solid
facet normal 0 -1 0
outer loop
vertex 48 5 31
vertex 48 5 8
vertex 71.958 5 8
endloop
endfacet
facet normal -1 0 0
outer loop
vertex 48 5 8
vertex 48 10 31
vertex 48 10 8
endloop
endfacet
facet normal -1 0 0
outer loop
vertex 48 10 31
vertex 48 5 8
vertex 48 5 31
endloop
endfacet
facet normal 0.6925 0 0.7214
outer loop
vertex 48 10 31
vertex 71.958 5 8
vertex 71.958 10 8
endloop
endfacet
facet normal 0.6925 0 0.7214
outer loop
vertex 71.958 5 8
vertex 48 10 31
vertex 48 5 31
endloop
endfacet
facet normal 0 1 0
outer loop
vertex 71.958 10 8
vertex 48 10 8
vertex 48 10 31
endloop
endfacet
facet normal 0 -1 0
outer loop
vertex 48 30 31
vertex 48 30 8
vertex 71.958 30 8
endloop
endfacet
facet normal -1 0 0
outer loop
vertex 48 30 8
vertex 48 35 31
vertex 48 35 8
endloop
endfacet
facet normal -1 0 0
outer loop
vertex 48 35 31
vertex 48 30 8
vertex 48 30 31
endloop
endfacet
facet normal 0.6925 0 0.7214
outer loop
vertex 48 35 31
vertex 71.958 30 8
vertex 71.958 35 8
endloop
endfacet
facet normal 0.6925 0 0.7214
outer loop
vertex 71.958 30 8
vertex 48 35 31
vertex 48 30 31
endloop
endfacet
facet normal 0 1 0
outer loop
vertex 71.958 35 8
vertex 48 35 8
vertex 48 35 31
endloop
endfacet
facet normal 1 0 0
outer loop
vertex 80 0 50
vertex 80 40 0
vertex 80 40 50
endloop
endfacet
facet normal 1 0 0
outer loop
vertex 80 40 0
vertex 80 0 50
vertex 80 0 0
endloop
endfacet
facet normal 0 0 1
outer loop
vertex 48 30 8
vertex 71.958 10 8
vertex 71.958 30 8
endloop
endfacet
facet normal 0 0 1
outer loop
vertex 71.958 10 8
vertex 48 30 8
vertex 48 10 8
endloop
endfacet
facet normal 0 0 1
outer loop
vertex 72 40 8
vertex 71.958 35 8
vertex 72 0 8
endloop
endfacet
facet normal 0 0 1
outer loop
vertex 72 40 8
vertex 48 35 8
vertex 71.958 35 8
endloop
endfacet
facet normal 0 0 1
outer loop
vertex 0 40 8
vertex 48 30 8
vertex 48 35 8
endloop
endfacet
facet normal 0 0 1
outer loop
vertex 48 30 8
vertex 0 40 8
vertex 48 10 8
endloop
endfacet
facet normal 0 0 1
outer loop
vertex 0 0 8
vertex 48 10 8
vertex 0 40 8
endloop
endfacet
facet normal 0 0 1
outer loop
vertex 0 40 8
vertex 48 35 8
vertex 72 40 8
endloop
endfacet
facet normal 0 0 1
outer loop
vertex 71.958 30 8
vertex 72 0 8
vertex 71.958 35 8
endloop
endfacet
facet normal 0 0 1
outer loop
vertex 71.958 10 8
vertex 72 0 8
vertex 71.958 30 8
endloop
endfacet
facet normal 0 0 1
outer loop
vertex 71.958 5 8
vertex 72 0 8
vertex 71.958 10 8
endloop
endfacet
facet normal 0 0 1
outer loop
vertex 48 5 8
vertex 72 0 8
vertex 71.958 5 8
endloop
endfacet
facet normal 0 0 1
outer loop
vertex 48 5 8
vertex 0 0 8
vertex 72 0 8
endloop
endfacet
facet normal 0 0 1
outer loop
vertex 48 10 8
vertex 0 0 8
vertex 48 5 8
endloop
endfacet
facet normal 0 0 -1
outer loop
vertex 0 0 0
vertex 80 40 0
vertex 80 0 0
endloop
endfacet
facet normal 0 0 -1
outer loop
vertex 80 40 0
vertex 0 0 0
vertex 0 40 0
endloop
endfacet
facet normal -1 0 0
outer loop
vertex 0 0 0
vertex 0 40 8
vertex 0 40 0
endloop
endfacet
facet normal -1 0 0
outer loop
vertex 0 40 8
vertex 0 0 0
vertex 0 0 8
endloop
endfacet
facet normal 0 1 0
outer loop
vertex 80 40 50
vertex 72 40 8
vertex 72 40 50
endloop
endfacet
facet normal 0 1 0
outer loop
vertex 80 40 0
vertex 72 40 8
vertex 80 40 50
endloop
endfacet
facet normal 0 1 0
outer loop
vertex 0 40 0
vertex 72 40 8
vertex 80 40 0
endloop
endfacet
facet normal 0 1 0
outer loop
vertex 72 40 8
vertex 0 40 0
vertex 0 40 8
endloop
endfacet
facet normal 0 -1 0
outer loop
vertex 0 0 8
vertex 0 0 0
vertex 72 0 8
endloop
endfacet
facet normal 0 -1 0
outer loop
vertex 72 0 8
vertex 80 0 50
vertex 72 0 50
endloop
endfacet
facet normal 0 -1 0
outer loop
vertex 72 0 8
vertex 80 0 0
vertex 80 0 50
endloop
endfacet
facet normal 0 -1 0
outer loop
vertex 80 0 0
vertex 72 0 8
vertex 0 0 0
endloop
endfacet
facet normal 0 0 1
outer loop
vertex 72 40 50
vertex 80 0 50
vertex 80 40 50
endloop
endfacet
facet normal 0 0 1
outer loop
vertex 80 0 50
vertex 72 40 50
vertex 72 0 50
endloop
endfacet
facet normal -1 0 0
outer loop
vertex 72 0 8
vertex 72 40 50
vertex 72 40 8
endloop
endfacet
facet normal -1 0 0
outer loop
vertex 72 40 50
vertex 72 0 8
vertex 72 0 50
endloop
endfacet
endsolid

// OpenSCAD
$fn = 32;

// ----------------------------------------------------------------------
// Rib bracket: 2-gusset L bracket
// ----------------------------------------------------------------------

// --- parameters (mm) ---
base_l = 80;              // foot length, X
base_w = 40;              // foot width, Y
base_t = 8;               // foot thickness
plate_t = 8;              // upright plate thickness
plate_h = 50;             // overall height
gus_l = 24;               // gusset leg along the foot
gus_h = 24;               // gusset height
gus_t = 5;                // gusset thickness
gus_edge = 5;             // gusset margin from the foot edge
n_gus = 2;                // gusset count

gus_pitch = (base_w - 2 * gus_edge - gus_t) / (n_gus - 1);  // gusset pitch

union() {
  cube([base_l, base_w, base_t]);
  translate([base_l - plate_t, 0, base_t - 1])
    cube([plate_t, base_w, plate_h - base_t + 1]);
  for (i = [0 : n_gus - 1])
    translate([base_l - plate_t - gus_l, gus_edge + i * gus_pitch, base_t - 1])
      rotate([-90, 0, 0])
        linear_extrude(height = gus_t)
          polygon(points = [[0, 0], [gus_l + 1, 0], [0, -gus_h]]);
}
